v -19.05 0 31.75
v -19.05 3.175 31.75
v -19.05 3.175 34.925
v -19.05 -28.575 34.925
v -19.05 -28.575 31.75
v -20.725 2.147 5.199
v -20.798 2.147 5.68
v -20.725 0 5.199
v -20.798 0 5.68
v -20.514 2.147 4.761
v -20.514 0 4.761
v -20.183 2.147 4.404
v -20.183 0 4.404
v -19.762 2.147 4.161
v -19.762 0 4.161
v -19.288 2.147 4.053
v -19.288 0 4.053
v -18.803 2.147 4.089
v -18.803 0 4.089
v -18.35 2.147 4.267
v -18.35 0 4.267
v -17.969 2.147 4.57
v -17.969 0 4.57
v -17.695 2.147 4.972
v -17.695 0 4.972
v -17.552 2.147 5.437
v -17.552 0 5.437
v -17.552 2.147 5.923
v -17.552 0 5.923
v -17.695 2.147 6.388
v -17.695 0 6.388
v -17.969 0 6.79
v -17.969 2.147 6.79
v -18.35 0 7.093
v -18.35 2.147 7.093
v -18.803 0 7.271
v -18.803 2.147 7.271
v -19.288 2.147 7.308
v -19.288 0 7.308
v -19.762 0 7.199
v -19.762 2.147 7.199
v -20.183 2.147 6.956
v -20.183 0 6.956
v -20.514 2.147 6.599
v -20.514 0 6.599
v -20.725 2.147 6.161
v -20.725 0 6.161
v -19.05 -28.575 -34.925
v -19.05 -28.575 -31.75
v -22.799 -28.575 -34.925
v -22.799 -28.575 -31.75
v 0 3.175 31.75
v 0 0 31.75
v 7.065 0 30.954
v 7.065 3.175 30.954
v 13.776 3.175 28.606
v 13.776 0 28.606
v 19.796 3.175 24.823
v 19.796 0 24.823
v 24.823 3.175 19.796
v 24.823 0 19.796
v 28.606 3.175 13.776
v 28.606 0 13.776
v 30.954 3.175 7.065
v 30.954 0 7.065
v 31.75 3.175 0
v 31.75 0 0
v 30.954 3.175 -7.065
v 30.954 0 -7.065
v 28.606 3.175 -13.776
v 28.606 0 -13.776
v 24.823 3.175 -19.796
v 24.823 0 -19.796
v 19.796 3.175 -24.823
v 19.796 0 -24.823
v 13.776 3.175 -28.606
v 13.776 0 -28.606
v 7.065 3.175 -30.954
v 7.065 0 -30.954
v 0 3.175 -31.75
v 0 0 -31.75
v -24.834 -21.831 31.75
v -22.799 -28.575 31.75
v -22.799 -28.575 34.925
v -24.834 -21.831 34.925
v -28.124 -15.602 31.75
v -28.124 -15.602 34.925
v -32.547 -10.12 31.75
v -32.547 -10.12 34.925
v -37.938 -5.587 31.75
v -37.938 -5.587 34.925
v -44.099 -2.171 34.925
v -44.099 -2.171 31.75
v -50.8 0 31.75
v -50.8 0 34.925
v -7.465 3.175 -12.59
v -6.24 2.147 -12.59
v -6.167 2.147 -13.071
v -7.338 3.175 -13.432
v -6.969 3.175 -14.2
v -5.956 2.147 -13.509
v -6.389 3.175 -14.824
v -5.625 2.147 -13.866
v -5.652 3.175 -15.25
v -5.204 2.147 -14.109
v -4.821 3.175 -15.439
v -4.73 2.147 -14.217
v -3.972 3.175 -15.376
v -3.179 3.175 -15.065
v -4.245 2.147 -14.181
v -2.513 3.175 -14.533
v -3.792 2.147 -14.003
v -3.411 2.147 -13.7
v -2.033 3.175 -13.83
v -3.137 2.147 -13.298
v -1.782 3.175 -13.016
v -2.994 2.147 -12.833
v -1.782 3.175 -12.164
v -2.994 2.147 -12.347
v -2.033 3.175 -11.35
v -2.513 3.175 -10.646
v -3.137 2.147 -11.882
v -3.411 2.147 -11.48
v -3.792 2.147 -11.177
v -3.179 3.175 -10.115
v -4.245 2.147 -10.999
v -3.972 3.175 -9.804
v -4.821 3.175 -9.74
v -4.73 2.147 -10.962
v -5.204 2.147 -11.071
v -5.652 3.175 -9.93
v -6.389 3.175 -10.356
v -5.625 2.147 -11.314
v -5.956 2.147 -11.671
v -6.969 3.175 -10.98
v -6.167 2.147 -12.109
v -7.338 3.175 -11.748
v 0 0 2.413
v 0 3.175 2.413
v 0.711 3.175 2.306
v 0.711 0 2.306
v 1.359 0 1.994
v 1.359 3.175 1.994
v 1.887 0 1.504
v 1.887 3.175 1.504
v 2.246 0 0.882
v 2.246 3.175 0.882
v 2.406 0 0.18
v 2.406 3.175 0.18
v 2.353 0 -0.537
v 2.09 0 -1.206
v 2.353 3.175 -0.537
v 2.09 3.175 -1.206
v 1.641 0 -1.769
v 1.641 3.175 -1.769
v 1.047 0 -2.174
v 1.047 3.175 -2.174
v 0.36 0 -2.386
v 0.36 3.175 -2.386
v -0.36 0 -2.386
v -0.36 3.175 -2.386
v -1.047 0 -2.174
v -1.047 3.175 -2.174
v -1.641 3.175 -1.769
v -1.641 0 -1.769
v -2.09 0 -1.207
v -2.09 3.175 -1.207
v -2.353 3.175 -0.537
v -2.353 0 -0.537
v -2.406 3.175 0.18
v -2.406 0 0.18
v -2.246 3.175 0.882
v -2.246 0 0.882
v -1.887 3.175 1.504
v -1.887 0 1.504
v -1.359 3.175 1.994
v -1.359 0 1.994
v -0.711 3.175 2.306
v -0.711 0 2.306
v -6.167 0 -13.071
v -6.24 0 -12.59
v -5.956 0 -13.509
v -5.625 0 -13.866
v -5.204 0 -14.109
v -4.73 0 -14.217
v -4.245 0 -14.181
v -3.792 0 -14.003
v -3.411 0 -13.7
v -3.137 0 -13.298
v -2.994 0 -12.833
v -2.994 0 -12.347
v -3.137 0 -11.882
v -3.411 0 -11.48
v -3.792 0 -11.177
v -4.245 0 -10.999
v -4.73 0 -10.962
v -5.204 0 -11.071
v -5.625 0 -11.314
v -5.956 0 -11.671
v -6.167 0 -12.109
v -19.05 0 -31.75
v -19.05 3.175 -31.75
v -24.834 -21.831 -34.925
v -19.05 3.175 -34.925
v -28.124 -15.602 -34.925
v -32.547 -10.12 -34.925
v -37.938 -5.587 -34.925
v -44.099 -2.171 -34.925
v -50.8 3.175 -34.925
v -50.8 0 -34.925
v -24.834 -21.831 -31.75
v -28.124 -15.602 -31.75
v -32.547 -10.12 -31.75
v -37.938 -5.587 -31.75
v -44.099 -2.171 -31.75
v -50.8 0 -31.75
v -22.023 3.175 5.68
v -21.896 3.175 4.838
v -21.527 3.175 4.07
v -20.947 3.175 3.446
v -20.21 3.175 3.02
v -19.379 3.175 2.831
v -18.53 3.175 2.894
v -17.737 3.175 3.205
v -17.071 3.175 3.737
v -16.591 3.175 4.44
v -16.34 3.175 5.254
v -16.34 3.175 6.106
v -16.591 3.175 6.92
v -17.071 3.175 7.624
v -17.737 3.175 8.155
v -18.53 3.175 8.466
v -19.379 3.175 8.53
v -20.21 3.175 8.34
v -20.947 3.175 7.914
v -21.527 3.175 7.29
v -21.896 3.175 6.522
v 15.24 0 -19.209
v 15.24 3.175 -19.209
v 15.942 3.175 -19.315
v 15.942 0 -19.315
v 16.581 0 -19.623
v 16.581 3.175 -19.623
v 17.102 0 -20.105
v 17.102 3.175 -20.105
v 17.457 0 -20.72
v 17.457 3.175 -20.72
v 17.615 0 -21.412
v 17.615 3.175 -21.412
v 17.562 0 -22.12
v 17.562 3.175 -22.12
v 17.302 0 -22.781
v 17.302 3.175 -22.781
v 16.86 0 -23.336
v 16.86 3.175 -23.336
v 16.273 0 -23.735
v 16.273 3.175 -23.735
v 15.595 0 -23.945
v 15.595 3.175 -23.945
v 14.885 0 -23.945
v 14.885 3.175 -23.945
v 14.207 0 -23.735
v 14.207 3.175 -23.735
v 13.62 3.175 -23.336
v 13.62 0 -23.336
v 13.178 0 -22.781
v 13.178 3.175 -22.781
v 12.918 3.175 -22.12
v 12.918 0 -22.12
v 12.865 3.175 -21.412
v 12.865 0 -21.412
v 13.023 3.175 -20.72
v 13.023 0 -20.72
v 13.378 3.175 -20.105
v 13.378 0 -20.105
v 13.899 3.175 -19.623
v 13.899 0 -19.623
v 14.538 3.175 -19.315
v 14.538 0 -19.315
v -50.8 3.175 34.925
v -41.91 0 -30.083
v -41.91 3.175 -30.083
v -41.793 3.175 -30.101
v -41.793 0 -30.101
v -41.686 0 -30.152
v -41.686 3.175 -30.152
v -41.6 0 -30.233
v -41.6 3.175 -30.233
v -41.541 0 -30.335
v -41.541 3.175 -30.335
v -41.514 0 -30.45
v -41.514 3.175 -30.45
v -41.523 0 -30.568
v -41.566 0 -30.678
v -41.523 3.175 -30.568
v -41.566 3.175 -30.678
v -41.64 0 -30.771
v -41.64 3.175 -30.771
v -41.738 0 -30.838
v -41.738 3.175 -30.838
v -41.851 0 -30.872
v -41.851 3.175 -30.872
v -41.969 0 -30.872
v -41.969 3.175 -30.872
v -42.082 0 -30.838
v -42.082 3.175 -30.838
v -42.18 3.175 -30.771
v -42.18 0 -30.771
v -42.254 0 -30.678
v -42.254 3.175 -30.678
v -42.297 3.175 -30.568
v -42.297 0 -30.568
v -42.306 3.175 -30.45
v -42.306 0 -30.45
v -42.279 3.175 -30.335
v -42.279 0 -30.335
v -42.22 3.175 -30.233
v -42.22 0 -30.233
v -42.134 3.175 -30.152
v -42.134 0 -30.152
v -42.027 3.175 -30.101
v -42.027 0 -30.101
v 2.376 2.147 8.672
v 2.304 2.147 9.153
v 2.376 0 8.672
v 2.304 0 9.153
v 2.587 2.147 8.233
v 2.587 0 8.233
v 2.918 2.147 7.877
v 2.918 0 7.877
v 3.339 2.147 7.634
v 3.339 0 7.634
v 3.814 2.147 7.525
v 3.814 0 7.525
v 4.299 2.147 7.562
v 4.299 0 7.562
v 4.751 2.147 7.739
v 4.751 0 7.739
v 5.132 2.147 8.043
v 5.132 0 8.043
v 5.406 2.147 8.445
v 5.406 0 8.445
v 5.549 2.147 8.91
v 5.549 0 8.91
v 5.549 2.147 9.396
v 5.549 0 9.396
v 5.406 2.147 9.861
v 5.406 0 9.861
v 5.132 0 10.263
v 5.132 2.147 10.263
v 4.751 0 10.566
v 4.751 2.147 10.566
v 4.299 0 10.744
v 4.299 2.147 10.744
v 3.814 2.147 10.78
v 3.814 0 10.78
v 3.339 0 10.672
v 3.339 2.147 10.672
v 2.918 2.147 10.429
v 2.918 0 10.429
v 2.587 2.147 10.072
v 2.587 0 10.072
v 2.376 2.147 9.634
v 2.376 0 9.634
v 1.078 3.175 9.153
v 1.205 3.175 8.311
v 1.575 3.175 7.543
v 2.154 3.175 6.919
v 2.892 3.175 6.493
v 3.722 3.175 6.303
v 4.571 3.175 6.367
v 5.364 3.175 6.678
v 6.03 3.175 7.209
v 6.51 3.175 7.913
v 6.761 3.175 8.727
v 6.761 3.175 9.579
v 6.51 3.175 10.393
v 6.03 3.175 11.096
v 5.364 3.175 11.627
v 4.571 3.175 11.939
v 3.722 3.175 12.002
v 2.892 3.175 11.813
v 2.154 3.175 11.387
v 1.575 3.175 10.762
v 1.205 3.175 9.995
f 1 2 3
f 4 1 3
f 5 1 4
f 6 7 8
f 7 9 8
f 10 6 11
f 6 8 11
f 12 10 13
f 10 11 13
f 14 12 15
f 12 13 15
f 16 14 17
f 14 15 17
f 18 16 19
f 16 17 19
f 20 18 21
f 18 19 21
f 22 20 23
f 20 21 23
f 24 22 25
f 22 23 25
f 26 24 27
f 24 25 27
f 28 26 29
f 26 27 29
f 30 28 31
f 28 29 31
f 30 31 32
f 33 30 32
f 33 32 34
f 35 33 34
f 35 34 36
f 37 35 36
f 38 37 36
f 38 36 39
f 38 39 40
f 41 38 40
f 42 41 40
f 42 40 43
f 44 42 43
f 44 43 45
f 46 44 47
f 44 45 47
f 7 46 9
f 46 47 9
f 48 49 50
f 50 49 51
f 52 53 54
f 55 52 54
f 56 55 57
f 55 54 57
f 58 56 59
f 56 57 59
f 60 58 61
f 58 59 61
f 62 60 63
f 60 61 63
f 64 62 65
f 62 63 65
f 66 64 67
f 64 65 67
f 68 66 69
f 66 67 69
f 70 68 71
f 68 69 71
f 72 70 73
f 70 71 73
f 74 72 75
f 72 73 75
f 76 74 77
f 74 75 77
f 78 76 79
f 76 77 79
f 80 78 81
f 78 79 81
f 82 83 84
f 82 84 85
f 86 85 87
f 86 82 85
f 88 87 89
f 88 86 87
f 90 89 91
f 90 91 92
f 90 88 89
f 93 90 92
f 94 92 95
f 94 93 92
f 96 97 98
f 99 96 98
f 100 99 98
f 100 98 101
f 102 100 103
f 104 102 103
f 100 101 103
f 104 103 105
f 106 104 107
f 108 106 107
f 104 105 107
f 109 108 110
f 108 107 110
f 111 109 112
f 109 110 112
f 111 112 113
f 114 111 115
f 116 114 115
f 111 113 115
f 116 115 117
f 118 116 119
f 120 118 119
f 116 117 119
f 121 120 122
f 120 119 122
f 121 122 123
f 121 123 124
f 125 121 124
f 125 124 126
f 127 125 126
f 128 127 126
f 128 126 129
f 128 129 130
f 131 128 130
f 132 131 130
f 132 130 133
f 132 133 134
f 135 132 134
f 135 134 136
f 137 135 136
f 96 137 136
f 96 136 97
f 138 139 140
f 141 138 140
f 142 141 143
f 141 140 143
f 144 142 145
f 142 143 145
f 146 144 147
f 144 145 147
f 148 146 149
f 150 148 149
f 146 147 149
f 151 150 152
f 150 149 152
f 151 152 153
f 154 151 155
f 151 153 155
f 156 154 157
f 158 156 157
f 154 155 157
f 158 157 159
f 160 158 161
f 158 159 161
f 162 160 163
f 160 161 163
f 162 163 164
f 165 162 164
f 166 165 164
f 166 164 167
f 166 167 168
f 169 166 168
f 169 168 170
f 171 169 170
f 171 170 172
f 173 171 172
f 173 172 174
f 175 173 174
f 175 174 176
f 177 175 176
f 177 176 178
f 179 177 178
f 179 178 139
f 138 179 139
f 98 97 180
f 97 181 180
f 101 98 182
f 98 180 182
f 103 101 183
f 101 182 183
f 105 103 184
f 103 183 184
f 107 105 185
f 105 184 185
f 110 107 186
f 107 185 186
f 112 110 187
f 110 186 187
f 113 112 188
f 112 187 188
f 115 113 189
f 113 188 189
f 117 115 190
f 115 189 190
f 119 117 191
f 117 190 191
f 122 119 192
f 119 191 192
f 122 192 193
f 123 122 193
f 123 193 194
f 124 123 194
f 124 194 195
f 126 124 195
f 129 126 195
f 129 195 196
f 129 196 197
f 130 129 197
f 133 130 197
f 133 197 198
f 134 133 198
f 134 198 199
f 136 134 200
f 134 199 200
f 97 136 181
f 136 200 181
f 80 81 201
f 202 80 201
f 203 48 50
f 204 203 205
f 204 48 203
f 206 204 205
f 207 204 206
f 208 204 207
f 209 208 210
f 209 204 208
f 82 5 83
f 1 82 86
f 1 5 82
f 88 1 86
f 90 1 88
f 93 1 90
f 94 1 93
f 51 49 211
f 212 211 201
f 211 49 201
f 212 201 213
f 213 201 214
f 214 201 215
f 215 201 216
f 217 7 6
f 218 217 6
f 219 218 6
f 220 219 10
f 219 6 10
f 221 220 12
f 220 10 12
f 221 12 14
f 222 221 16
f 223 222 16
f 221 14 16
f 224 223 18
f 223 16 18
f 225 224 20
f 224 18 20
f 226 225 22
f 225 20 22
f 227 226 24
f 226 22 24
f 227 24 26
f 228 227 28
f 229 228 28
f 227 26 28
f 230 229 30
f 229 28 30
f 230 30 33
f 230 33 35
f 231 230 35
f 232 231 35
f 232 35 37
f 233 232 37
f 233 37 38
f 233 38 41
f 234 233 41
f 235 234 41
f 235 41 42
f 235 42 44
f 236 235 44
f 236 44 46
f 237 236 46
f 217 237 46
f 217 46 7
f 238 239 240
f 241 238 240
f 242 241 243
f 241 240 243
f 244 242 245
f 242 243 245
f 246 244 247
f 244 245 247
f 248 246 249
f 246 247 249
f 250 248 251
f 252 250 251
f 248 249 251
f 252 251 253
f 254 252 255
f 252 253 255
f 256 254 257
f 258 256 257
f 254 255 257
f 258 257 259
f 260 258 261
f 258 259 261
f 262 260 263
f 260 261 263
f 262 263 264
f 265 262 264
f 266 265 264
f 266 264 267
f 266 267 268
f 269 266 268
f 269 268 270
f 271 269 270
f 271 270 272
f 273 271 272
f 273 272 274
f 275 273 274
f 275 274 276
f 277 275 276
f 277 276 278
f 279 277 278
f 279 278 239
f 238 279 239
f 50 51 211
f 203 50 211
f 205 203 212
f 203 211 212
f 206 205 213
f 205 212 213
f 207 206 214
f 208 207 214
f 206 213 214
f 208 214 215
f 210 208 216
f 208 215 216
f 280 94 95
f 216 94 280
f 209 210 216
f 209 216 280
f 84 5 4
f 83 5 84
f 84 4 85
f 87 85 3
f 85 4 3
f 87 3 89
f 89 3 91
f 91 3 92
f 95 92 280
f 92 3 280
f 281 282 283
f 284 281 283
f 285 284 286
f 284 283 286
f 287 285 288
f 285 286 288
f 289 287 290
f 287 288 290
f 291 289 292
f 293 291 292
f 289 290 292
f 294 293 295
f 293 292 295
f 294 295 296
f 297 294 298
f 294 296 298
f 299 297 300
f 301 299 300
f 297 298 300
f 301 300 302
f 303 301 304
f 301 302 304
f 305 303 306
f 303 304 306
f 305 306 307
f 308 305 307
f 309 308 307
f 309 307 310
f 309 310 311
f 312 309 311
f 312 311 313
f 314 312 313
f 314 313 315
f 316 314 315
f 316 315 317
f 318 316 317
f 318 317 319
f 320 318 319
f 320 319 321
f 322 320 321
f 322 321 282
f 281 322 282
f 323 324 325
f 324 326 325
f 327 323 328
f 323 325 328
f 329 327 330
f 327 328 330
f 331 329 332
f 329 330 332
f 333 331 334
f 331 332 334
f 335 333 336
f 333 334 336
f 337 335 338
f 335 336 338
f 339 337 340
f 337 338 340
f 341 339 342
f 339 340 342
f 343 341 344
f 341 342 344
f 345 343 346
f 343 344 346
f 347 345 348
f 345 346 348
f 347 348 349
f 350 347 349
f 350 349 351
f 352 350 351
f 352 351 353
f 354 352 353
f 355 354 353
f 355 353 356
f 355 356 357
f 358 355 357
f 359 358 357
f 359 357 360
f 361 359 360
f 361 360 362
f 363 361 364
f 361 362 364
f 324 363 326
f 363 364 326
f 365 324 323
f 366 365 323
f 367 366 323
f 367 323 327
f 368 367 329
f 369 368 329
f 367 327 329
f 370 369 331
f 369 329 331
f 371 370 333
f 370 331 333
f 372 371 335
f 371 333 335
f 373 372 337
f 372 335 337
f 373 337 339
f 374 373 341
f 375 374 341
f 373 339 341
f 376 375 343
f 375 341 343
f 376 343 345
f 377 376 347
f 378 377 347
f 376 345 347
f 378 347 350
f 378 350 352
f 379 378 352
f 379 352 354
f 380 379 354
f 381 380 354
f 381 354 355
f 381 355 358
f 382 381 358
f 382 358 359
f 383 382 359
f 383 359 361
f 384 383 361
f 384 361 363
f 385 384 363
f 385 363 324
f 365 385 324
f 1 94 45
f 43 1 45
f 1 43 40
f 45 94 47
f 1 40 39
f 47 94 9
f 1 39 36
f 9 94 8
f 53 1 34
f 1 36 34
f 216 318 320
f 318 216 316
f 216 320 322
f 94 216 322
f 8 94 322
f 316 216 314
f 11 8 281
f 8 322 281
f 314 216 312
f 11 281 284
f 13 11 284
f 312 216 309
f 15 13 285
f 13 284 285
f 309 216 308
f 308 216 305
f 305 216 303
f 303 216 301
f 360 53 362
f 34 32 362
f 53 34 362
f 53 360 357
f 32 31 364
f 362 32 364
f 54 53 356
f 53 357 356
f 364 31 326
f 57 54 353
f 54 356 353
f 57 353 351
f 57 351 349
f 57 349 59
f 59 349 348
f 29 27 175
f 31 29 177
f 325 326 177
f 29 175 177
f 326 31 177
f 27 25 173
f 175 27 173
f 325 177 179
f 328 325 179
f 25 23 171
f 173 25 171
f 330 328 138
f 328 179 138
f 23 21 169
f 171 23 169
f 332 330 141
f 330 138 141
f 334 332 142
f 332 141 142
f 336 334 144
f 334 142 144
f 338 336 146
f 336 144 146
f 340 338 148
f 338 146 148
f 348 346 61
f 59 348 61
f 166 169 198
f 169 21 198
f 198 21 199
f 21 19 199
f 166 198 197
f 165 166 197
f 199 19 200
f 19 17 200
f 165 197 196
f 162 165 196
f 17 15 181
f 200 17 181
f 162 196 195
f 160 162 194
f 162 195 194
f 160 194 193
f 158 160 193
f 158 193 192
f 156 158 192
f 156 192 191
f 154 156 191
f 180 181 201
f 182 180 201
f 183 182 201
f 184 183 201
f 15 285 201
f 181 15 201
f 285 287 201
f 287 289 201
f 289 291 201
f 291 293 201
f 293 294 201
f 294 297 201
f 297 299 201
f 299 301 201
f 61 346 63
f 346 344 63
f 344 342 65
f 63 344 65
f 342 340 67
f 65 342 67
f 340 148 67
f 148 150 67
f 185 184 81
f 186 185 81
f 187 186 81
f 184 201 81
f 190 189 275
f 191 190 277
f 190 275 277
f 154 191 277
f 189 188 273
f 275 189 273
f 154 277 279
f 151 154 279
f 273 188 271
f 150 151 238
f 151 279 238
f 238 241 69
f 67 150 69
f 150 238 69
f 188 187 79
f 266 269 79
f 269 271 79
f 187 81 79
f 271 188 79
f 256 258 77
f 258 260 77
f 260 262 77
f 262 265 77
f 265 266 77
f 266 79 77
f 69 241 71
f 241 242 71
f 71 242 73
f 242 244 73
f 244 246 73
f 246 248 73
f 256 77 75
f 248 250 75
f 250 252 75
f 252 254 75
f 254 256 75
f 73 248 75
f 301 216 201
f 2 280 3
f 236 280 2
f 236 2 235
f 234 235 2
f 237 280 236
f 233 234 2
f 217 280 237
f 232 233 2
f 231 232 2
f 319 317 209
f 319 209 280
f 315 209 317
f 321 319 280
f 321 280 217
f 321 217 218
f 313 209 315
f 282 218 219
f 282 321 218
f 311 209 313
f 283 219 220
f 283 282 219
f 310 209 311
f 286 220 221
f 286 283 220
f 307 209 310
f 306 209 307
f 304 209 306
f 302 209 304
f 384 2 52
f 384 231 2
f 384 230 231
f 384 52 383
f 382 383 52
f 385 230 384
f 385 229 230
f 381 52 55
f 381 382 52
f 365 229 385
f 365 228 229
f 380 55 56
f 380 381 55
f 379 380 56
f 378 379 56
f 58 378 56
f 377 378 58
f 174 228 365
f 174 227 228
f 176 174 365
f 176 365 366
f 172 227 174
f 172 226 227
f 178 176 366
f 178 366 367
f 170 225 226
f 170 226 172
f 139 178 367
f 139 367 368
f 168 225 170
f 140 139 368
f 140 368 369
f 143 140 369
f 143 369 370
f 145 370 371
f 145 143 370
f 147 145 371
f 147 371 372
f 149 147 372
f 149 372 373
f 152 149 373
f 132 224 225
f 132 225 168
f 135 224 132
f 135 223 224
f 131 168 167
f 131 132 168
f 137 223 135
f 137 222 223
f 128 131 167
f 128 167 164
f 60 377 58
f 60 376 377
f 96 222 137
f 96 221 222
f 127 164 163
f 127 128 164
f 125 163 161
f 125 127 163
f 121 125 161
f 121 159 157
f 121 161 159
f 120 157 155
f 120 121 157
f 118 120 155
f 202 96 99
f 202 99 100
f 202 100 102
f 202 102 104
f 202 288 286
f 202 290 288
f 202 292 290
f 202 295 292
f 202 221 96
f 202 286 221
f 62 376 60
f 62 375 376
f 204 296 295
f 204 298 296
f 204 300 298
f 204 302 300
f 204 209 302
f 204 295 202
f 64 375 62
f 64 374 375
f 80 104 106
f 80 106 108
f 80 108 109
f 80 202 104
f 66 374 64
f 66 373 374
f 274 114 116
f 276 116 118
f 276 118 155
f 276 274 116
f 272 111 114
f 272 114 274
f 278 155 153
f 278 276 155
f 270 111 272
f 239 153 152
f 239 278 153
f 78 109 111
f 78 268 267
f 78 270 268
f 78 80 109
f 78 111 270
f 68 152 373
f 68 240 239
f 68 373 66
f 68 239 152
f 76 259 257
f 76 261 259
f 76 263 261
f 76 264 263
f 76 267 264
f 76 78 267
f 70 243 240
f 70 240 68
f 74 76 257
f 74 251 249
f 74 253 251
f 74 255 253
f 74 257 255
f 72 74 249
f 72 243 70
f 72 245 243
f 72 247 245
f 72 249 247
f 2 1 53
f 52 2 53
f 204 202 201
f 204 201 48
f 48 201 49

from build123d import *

# Parameters (mm, degrees)
BOSS_EXTRUDE1_DEPTH                               = 3.175
SKETCH2_R                                         = 2.413
SKETCH2_R_2                                       = 0.79375
CUT_EXTRUDE1_DEPTH                                = 60.989858518
CSK_FOR_4_FLAT_HEAD_MACHINE_SCREW_100_D           = 3.2639
CSK_FOR_4_FLAT_HEAD_MACHINE_SCREW_100_CSINK_D     = 5.715
CSK_FOR_4_FLAT_HEAD_MACHINE_SCREW_100_CSINK_ANGLE = 100
SKETCH5_R                                         = 2.38125
SKETCH5_R_2                                       = 0.396875
CUT_EXTRUDE2_DEPTH                                = 60.989858518
BOSS_EXTRUDE2_DEPTH                               = 3.175


with BuildPart() as part:
    # Sketch1 → Boss-Extrude1 (new body)
    with BuildSketch(Plane(origin=(0, 0, 0), x_dir=(1, 0, 0), z_dir=(0, 1, 0))):
        with BuildLine():
            Line((0, 31.75), (-50.8, 31.75))
            Line((-50.8, 31.75), (-50.8, -31.75))
            Line((-50.8, -31.75), (0, -31.75))
            ThreePointArc((0, -31.75), (31.75, 0), (0, 31.75))
        make_face()
    extrude(amount=BOSS_EXTRUDE1_DEPTH)

    # Sketch2 → Cut-Extrude1 (cut, through all)
    with BuildSketch(Plane(origin=(0, 3.175, 0), x_dir=(1, 0, 0), z_dir=(0, 1, 0))):
        with Locations(Location((0, 0, 0), (0, 0, 270))):
            Circle(SKETCH2_R)
        with Locations(Location((-19.165786135, -5.680153436, 0), (0, 0, 270))):
            Circle(SKETCH2_R_2)
        with Locations(Location((-4.607724074, 12.589841237, 0), (0, 0, 270))):
            Circle(SKETCH2_R_2)
        with Locations(Location((3.935524409, -9.152807674, 0), (0, 0, 270))):
            Circle(SKETCH2_R_2)
    extrude(amount=-CUT_EXTRUDE1_DEPTH, mode=Mode.SUBTRACT)

    # CSK for #4 Flat Head Machine Screw (100)1 (through all)
    with Locations(Plane(origin=(0, 3.175, 0), x_dir=(1, 0, 0), z_dir=(0, 1, 0))):
        with Locations((3.935524409, -9.152807674), (-19.165786135, -5.680153436), (-4.607724074, 12.589841237)):
            CounterSinkHole(CSK_FOR_4_FLAT_HEAD_MACHINE_SCREW_100_D / 2, CSK_FOR_4_FLAT_HEAD_MACHINE_SCREW_100_CSINK_D / 2, counter_sink_angle=CSK_FOR_4_FLAT_HEAD_MACHINE_SCREW_100_CSINK_ANGLE)

    # Sketch5 → Cut-Extrude2 (cut, through all)
    with BuildSketch(Plane(origin=(0, 3.175, 0), x_dir=(1, 0, 0), z_dir=(0, 1, 0))):
        with Locations(Location((15.24, 21.59, 0), (0, 0, 270))):
            Circle(SKETCH5_R)
        with Locations(Location((-41.91, 30.48, 0), (0, 0, 270))):
            Circle(SKETCH5_R_2)
    extrude(amount=-CUT_EXTRUDE2_DEPTH, mode=Mode.SUBTRACT)

    # Sketch6 → Boss-Extrude2 (add)
    with BuildSketch(Plane(origin=(0, 0, -31.75), x_dir=(-1, 0, 0), z_dir=(0, 0, -1))):
        with BuildLine():
            Line((50.8, 3.175), (19.05, 3.175))
            Line((19.05, 3.175), (19.05, -28.575))
            Line((19.05, -28.575), (22.799338861, -28.575))
            ThreePointArc((22.799338861, -28.575), (32.546509941, -10.119826243), (50.8, 0))
            Line((50.8, 0), (50.8, 3.175))
        make_face()
    boss_extrude2 = extrude(amount=BOSS_EXTRUDE2_DEPTH)

    # Mirror1: Boss-Extrude2 across plane
    add(boss_extrude2.mirror(Plane.XY))


solid = part.part
